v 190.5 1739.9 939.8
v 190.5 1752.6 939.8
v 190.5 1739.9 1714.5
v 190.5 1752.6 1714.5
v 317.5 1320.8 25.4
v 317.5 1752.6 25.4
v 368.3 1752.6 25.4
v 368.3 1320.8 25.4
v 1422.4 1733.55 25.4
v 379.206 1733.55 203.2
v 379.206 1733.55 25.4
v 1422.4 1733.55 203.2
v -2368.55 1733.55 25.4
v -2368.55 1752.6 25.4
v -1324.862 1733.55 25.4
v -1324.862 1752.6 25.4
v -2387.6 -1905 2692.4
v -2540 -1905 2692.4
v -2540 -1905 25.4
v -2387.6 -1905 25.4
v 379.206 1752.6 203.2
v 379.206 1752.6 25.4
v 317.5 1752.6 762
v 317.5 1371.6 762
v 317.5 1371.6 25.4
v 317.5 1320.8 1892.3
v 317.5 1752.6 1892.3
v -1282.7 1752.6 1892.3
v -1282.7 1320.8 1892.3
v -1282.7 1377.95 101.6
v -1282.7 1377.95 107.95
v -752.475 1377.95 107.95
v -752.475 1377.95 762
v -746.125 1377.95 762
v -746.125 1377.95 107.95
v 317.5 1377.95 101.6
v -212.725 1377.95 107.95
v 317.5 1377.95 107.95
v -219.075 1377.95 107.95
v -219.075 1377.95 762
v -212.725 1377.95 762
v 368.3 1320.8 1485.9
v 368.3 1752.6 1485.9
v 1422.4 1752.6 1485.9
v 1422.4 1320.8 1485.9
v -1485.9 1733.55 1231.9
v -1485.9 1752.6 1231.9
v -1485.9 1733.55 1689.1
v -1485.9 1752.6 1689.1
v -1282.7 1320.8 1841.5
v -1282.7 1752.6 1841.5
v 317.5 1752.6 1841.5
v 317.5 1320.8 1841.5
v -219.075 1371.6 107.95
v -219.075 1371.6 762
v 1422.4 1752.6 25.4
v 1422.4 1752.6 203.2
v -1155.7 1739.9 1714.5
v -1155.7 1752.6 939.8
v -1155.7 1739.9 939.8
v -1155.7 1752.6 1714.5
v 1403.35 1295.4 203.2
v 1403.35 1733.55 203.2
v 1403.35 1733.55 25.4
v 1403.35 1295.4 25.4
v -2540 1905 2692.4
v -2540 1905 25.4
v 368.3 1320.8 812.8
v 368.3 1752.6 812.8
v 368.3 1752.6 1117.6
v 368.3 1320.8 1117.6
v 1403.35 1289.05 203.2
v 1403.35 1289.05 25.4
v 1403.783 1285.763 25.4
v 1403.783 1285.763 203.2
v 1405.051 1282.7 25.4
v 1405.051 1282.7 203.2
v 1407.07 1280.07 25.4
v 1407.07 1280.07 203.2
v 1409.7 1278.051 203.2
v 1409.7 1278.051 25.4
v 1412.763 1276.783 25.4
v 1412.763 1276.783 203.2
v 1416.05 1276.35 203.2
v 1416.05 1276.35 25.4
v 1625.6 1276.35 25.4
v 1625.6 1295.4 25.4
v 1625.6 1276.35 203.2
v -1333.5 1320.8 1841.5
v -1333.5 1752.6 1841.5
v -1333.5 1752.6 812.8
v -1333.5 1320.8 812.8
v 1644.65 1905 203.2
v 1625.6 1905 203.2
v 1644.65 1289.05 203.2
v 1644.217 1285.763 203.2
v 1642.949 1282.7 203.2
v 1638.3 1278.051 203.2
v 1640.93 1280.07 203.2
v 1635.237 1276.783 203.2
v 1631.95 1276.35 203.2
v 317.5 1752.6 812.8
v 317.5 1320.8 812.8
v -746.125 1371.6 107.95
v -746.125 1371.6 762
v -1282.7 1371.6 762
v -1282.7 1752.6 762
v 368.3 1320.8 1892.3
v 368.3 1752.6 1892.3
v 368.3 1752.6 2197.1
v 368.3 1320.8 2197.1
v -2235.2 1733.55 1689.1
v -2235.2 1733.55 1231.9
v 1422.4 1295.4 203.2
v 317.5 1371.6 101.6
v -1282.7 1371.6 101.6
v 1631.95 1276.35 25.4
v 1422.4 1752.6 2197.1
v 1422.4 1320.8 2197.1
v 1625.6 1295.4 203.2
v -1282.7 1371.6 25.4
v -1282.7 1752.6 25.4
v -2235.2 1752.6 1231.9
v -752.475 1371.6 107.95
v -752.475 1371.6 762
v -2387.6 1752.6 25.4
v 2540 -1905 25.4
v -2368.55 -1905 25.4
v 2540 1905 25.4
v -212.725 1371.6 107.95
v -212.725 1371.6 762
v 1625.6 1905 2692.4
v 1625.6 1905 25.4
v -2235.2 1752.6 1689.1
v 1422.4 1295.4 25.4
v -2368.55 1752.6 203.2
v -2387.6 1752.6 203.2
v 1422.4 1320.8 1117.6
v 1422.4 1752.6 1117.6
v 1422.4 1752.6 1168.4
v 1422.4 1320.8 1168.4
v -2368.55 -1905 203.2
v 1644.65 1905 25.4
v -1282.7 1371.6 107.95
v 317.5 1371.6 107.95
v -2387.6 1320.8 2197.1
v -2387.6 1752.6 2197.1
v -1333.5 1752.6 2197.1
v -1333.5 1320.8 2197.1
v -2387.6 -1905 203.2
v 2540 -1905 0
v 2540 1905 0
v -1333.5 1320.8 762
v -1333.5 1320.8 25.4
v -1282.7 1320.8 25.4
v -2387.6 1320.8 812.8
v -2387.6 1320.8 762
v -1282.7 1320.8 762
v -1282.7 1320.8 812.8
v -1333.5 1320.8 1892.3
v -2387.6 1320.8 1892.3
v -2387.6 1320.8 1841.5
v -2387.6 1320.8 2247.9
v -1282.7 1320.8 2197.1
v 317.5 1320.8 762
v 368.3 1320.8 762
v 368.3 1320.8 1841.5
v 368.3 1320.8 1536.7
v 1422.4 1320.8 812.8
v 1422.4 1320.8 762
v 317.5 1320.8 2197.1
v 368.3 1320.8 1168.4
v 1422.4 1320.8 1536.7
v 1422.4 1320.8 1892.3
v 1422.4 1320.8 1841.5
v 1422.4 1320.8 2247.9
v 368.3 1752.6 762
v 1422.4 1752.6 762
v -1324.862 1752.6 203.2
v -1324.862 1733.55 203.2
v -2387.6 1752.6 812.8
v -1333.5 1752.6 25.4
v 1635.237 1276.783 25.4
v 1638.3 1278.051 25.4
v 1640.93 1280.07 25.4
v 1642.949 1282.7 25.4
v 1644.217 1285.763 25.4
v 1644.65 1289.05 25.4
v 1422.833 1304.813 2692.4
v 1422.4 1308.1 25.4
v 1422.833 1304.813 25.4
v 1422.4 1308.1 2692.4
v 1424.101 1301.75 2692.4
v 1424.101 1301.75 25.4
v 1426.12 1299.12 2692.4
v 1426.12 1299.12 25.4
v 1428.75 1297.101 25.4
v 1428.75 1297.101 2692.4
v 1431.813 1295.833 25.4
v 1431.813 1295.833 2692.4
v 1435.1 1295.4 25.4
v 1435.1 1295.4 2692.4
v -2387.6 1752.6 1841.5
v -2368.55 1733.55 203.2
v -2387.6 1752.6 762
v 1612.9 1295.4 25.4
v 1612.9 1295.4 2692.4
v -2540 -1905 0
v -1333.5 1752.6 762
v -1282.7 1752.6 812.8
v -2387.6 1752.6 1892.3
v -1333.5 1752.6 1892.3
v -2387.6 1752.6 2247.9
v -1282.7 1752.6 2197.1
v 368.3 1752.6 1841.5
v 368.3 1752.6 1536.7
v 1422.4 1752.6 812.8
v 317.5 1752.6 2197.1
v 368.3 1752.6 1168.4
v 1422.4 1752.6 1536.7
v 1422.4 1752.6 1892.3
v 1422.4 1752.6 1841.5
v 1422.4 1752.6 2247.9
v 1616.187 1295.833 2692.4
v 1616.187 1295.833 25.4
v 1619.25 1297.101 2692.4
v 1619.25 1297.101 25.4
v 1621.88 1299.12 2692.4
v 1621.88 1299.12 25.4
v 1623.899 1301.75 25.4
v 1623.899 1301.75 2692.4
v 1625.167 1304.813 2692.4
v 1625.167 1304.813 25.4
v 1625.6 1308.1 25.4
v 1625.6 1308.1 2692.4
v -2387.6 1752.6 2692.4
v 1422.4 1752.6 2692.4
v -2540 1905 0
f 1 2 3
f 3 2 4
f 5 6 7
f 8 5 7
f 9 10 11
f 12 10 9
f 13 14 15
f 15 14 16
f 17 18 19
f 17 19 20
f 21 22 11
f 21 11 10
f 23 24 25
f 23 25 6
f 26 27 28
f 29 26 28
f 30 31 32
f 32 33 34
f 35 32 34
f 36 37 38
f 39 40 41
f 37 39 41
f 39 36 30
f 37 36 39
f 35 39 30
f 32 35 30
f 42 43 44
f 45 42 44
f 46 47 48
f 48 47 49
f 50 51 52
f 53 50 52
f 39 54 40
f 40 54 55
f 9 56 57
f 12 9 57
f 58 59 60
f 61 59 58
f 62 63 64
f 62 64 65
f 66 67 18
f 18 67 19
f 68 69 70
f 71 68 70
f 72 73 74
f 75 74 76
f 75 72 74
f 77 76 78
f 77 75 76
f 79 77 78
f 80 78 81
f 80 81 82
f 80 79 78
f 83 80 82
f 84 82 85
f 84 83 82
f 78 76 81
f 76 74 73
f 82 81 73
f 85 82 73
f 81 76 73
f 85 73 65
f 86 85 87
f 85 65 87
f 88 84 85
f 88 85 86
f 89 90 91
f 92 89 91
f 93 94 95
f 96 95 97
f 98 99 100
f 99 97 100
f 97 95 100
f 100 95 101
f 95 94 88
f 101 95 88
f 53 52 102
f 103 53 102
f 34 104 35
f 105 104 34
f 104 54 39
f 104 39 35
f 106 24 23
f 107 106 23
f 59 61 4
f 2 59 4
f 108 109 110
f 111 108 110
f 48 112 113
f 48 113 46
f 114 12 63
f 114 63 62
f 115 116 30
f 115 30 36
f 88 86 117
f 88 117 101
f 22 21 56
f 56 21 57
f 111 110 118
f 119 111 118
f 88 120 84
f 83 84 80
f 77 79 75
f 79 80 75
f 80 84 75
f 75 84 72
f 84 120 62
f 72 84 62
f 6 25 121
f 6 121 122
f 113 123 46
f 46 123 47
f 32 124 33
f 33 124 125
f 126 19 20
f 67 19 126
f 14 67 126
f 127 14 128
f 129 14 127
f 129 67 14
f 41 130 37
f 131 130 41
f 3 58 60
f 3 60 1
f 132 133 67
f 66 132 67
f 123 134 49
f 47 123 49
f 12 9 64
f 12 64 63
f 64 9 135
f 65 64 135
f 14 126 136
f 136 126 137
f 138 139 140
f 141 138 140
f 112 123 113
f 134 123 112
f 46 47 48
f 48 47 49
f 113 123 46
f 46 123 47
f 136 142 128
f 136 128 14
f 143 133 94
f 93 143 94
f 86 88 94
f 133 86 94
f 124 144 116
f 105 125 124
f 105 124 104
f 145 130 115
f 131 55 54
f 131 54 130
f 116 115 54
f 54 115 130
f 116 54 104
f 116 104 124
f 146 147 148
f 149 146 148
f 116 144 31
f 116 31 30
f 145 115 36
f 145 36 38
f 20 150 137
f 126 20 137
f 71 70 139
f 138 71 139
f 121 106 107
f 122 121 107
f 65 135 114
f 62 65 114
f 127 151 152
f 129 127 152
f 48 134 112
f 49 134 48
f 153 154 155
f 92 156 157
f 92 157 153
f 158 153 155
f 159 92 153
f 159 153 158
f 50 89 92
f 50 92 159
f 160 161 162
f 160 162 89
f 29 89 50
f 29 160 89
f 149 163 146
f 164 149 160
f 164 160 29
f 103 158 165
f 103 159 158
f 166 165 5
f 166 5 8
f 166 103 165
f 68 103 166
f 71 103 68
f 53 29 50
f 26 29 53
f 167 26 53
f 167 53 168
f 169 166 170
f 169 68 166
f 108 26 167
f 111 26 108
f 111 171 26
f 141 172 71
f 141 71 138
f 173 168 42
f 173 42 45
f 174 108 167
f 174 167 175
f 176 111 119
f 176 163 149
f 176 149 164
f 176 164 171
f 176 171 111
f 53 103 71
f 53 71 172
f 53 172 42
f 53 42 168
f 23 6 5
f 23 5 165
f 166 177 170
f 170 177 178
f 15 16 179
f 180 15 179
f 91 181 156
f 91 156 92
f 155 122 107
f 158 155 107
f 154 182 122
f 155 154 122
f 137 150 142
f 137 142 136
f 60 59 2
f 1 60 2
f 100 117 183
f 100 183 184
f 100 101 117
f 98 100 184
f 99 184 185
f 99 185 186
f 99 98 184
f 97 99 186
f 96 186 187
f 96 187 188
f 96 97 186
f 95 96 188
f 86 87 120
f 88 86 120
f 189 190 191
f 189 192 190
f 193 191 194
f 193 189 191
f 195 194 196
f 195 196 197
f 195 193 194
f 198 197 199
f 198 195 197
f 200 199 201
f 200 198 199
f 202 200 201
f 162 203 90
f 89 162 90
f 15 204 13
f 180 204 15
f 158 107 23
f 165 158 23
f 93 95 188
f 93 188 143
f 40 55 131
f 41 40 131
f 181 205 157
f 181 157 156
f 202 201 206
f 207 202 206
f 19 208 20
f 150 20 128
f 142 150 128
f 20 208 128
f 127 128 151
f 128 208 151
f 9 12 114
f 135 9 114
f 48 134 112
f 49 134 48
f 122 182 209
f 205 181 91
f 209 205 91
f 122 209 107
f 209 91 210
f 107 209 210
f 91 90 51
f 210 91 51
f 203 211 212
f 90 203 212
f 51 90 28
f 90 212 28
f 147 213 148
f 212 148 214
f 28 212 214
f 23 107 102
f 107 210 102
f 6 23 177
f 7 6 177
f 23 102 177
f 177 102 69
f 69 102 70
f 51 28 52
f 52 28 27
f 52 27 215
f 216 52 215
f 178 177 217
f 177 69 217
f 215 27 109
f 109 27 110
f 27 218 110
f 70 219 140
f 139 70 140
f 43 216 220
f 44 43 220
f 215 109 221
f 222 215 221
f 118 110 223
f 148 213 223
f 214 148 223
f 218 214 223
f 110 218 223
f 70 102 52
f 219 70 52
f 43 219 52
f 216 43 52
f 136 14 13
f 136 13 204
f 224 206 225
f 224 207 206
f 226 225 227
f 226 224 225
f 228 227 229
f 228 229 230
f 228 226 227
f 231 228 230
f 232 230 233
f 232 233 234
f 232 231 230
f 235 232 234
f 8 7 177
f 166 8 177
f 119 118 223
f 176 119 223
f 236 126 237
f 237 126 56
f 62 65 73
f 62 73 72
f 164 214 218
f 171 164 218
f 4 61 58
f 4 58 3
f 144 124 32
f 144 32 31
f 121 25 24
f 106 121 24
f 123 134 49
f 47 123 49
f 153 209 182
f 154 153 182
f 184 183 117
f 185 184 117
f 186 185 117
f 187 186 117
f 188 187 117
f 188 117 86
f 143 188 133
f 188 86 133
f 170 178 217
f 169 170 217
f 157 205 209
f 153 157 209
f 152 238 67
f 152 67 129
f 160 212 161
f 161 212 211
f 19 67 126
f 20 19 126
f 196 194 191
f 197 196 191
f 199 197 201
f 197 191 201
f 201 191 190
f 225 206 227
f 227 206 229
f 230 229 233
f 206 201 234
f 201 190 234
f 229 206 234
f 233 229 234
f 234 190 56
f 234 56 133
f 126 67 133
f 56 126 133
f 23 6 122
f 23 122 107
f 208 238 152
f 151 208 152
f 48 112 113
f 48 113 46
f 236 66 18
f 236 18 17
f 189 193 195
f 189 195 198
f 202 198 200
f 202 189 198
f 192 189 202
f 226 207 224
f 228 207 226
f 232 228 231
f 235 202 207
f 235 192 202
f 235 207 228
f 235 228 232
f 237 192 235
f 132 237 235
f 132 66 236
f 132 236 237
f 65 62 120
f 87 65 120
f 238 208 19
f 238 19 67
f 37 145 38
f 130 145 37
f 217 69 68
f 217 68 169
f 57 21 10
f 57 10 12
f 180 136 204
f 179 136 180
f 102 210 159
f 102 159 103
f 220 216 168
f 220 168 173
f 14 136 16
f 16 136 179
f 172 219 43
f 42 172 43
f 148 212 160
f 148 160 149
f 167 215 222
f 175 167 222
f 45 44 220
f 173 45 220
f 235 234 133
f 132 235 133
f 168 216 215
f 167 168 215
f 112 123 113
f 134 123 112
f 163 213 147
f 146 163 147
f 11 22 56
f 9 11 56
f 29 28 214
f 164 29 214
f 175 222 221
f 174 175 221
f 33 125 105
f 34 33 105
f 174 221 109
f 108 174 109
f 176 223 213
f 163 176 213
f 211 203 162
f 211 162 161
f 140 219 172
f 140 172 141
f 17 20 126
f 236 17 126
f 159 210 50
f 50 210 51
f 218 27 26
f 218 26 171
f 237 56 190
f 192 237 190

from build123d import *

# Parameters (mm, degrees)
F0_W      = 5080
F0_H      = 3810
F1_DEPTH  = 25.4
F3_DEPTH  = 2667
F4_W      = 3657.6
F4_H      = 177.8
F5_DEPTH  = 19.05
F7_W      = 438.15
F7_H      = 177.8
F8_DEPTH  = 19.05
F9_W      = 203.2
F9_H      = 177.8
F9_W_2    = 19.05
F10_DEPTH = 19.05
F11_W     = 609.6
F11_H     = 177.8
F11_W_2   = 19.05
F12_DEPTH = 19.05
F13_W     = 1346.2
F13_H     = 774.7
F14_DEPTH = 12.7
F15_W     = 1054.1
F15_H     = 50.8
F15_W_2   = 50.8
F15_W_3   = 1600.2
F15_H_2   = 1028.7
F15_H_3   = 736.6
F15_H_4   = 304.8
F16_DEPTH = 431.8
F17_W     = 381
F17_H     = 736.6
F18_DEPTH = 1600.2
F20_W     = 749.3
F20_H     = 457.2
F21_DEPTH = 19.05
F22_DEPTH = 19.05
F23_R     = 12.7
F23_2_R   = 12.7
F23_3_R   = 12.7
F24_W     = 1043.194326067
F24_H     = 177.8
F25_DEPTH = 19.05
F26_W     = 1043.6879966736
F26_H     = 177.8
F27_DEPTH = 19.05
F19_W     = 6.35
F19_H     = 654.05
F28_DEPTH = 6.35


# Not quite as in the source:
# - a feature names something its author has since deleted; it is built from what else it names


with BuildPart() as f1:
    # F0 (on Top) → F1 (new body)
    with BuildSketch(Plane.XY):
        Rectangle(F0_W, F0_H)
    extrude(amount=F1_DEPTH)

    # F4 (on face) → F5 (join)
    with BuildSketch(Plane.YZ.offset(-2387.6)):
        with Locations((-76.2, 114.3)):
            Rectangle(F4_W, F4_H)
    extrude(amount=F5_DEPTH)


with BuildPart() as f3:
    # F2 (on face) → F3 (new body)
    with BuildSketch(Plane.XY.offset(25.4)):
        Polygon((-2540, -1905), (-2387.6, -1905), (-2387.6, 1752.6), (1422.4, 1752.6), (1422.4, 1295.4), (1625.6, 1295.4), (1625.6, 1905), (-2540, 1905), align=None)
    extrude(amount=F3_DEPTH)

    # F23
    f23_edges = [f3.edges().sort_by_distance(p)[0] for p in [
        (1422.4, 1295.4, 1358.9),
        (1625.6, 1295.4, 1358.9),
    ]]
    fillet(f23_edges, radius=F23_R)


with BuildPart() as f8:
    # F7 (on face) → F8 (new body)
    with BuildSketch(Plane(origin=(1422.4, 0, 0), x_dir=(0, -1, 0), z_dir=(-1, 0, 0))):
        with Locations((-1514.475, 114.3)):
            Rectangle(F7_W, F7_H)
    extrude(amount=F8_DEPTH)


with BuildPart() as f10:
    # F9 (on face) → F10 (new body)
    with BuildSketch(Plane.XZ.offset(-1295.4)):
        with Locations((1524, 114.3)):
            Rectangle(F9_W, F9_H)
        with Locations((1412.875, 114.3)):
            Rectangle(F9_W_2, F9_H)
    extrude(amount=F10_DEPTH)

    # F23#2
    f23_2_edges = [f10.edges().sort_by_distance(p)[0] for p in [
        (1403.35, 1276.35, 114.3),
    ]]
    fillet(f23_2_edges, radius=F23_2_R)


with BuildPart() as f12:
    # F11 (on face) → F12 (new body)
    with BuildSketch(Plane.YZ.offset(1625.6)):
        with Locations((1600.2, 114.3)):
            Rectangle(F11_W, F11_H)
        with Locations((1285.875, 114.3)):
            Rectangle(F11_W_2, F11_H)
    extrude(amount=F12_DEPTH)

    # F23#3
    f23_3_edges = [f12.edges().sort_by_distance(p)[0] for p in [
        (1644.65, 1276.35, 114.3),
    ]]
    fillet(f23_3_edges, radius=F23_3_R)


with BuildPart() as f14:
    # F13 (on face) → F14 (new body)
    with BuildSketch(Plane.XZ.offset(-1752.6)):
        with Locations((-482.6, 1327.15)):
            Rectangle(F13_W, F13_H)
    extrude(amount=F14_DEPTH)


with BuildPart() as f16:
    # F15 (on face) → F16 (new body)
    with BuildSketch(Plane.XZ.offset(-1752.6)):
        Polygon((-2387.6, 2247.9), (-2387.6, 2197.1), (-1333.5, 2197.1), (-1282.7, 2197.1), (-1282.7, 2247.9), align=None)
        Polygon((-1282.7, 2247.9), (-1282.7, 2197.1), (317.5, 2197.1), (368.3, 2197.1), (1422.4, 2197.1), (1422.4, 2247.9), align=None)
        with Locations((-1860.55, 1866.9)):
            Rectangle(F15_W, F15_H)
        with Locations((-1308.1, 1866.9)):
            Rectangle(F15_W_2, F15_H)
        with Locations((-482.6, 1866.9)):
            Rectangle(F15_W_3, F15_H)
        with Locations((342.9, 1866.9)):
            Rectangle(F15_W_2, F15_H)
        with Locations((895.35, 1866.9)):
            Rectangle(F15_W, F15_H)
        with Locations((-1308.1, 1327.15)):
            Rectangle(F15_W_2, F15_H_2)
        Polygon((368.3, 1841.5), (317.5, 1841.5), (317.5, 812.8), (368.3, 812.8), (368.3, 1117.6), (368.3, 1168.4), (368.3, 1485.9), (368.3, 1536.7), align=None)
        with Locations((895.35, 787.4)):
            Rectangle(F15_W, F15_H)
        with Locations((342.9, 787.4)):
            Rectangle(F15_W_2, F15_H)
        with Locations((-482.6, 787.4)):
            Rectangle(F15_W_3, F15_H)
        with Locations((342.9, 393.7)):
            Rectangle(F15_W_2, F15_H_3)
        with Locations((-1308.1, 787.4)):
            Rectangle(F15_W_2, F15_H)
        with Locations((-1308.1, 393.7)):
            Rectangle(F15_W_2, F15_H_3)
        with Locations((-1860.55, 787.4)):
            Rectangle(F15_W, F15_H)
        with Locations((895.35, 1143)):
            Rectangle(F15_W, F15_H)
        with Locations((895.35, 1511.3)):
            Rectangle(F15_W, F15_H)
        with Locations((342.9, 2044.7)):
            Rectangle(F15_W_2, F15_H_4)
        with Locations((-1308.1, 2044.7)):
            Rectangle(F15_W_2, F15_H_4)
    extrude(amount=F16_DEPTH)


with BuildPart() as f18:
    # F17 (on face) → F18 (new body, through all)
    with BuildSketch(Plane.YZ.offset(-1282.7)):
        with Locations((1562.1, 393.7)):
            Rectangle(F17_W, F17_H)
    extrude(amount=F18_DEPTH)


with BuildPart() as f21:
    # F20 (on face) → F21 (new body)
    with BuildSketch(Plane.XZ.offset(-1752.6)):
        with Locations((-1860.55, 1460.5)):
            Rectangle(F20_W, F20_H)
    extrude(amount=F21_DEPTH)


with BuildPart() as f22:
    # F20 (on face) → F22 (new body)
    with BuildSketch(Plane.XZ.offset(-1752.6)):
        with Locations((-1860.55, 1460.5)):
            Rectangle(F20_W, F20_H)
    extrude(amount=F22_DEPTH)


with BuildPart() as f25:
    # F24 (on face) → F25 (new body)
    with BuildSketch(Plane.XZ.offset(-1752.6)):
        with Locations((900.8028369665, 114.3)):
            Rectangle(F24_W, F24_H)
    extrude(amount=F25_DEPTH)


with BuildPart() as f27:
    # F26 (on face) → F27 (new body)
    with BuildSketch(Plane.XZ.offset(-1752.6)):
        with Locations((-1846.7060016632, 114.3)):
            Rectangle(F26_W, F26_H)
    extrude(amount=F27_DEPTH)


with BuildPart() as f28:
    # F19 (on face) → F28 (new body)
    with BuildSketch(Plane.XZ.offset(-1371.6)):
        Polygon((-1282.7, 107.95), (-1282.7, 101.6), (317.5, 101.6), (317.5, 107.95), (-212.725, 107.95), (-219.075, 107.95), (-746.125, 107.95), (-752.475, 107.95), align=None)
        with Locations((-215.9, 434.975)):
            Rectangle(F19_W, F19_H)
        with Locations((-749.3, 434.975)):
            Rectangle(F19_W, F19_H)
    extrude(amount=-F28_DEPTH)


solid = Compound([f1.part, f3.part, f8.part, f10.part, f12.part, f14.part, f16.part, f18.part, f21.part, f22.part, f25.part, f27.part, f28.part])
